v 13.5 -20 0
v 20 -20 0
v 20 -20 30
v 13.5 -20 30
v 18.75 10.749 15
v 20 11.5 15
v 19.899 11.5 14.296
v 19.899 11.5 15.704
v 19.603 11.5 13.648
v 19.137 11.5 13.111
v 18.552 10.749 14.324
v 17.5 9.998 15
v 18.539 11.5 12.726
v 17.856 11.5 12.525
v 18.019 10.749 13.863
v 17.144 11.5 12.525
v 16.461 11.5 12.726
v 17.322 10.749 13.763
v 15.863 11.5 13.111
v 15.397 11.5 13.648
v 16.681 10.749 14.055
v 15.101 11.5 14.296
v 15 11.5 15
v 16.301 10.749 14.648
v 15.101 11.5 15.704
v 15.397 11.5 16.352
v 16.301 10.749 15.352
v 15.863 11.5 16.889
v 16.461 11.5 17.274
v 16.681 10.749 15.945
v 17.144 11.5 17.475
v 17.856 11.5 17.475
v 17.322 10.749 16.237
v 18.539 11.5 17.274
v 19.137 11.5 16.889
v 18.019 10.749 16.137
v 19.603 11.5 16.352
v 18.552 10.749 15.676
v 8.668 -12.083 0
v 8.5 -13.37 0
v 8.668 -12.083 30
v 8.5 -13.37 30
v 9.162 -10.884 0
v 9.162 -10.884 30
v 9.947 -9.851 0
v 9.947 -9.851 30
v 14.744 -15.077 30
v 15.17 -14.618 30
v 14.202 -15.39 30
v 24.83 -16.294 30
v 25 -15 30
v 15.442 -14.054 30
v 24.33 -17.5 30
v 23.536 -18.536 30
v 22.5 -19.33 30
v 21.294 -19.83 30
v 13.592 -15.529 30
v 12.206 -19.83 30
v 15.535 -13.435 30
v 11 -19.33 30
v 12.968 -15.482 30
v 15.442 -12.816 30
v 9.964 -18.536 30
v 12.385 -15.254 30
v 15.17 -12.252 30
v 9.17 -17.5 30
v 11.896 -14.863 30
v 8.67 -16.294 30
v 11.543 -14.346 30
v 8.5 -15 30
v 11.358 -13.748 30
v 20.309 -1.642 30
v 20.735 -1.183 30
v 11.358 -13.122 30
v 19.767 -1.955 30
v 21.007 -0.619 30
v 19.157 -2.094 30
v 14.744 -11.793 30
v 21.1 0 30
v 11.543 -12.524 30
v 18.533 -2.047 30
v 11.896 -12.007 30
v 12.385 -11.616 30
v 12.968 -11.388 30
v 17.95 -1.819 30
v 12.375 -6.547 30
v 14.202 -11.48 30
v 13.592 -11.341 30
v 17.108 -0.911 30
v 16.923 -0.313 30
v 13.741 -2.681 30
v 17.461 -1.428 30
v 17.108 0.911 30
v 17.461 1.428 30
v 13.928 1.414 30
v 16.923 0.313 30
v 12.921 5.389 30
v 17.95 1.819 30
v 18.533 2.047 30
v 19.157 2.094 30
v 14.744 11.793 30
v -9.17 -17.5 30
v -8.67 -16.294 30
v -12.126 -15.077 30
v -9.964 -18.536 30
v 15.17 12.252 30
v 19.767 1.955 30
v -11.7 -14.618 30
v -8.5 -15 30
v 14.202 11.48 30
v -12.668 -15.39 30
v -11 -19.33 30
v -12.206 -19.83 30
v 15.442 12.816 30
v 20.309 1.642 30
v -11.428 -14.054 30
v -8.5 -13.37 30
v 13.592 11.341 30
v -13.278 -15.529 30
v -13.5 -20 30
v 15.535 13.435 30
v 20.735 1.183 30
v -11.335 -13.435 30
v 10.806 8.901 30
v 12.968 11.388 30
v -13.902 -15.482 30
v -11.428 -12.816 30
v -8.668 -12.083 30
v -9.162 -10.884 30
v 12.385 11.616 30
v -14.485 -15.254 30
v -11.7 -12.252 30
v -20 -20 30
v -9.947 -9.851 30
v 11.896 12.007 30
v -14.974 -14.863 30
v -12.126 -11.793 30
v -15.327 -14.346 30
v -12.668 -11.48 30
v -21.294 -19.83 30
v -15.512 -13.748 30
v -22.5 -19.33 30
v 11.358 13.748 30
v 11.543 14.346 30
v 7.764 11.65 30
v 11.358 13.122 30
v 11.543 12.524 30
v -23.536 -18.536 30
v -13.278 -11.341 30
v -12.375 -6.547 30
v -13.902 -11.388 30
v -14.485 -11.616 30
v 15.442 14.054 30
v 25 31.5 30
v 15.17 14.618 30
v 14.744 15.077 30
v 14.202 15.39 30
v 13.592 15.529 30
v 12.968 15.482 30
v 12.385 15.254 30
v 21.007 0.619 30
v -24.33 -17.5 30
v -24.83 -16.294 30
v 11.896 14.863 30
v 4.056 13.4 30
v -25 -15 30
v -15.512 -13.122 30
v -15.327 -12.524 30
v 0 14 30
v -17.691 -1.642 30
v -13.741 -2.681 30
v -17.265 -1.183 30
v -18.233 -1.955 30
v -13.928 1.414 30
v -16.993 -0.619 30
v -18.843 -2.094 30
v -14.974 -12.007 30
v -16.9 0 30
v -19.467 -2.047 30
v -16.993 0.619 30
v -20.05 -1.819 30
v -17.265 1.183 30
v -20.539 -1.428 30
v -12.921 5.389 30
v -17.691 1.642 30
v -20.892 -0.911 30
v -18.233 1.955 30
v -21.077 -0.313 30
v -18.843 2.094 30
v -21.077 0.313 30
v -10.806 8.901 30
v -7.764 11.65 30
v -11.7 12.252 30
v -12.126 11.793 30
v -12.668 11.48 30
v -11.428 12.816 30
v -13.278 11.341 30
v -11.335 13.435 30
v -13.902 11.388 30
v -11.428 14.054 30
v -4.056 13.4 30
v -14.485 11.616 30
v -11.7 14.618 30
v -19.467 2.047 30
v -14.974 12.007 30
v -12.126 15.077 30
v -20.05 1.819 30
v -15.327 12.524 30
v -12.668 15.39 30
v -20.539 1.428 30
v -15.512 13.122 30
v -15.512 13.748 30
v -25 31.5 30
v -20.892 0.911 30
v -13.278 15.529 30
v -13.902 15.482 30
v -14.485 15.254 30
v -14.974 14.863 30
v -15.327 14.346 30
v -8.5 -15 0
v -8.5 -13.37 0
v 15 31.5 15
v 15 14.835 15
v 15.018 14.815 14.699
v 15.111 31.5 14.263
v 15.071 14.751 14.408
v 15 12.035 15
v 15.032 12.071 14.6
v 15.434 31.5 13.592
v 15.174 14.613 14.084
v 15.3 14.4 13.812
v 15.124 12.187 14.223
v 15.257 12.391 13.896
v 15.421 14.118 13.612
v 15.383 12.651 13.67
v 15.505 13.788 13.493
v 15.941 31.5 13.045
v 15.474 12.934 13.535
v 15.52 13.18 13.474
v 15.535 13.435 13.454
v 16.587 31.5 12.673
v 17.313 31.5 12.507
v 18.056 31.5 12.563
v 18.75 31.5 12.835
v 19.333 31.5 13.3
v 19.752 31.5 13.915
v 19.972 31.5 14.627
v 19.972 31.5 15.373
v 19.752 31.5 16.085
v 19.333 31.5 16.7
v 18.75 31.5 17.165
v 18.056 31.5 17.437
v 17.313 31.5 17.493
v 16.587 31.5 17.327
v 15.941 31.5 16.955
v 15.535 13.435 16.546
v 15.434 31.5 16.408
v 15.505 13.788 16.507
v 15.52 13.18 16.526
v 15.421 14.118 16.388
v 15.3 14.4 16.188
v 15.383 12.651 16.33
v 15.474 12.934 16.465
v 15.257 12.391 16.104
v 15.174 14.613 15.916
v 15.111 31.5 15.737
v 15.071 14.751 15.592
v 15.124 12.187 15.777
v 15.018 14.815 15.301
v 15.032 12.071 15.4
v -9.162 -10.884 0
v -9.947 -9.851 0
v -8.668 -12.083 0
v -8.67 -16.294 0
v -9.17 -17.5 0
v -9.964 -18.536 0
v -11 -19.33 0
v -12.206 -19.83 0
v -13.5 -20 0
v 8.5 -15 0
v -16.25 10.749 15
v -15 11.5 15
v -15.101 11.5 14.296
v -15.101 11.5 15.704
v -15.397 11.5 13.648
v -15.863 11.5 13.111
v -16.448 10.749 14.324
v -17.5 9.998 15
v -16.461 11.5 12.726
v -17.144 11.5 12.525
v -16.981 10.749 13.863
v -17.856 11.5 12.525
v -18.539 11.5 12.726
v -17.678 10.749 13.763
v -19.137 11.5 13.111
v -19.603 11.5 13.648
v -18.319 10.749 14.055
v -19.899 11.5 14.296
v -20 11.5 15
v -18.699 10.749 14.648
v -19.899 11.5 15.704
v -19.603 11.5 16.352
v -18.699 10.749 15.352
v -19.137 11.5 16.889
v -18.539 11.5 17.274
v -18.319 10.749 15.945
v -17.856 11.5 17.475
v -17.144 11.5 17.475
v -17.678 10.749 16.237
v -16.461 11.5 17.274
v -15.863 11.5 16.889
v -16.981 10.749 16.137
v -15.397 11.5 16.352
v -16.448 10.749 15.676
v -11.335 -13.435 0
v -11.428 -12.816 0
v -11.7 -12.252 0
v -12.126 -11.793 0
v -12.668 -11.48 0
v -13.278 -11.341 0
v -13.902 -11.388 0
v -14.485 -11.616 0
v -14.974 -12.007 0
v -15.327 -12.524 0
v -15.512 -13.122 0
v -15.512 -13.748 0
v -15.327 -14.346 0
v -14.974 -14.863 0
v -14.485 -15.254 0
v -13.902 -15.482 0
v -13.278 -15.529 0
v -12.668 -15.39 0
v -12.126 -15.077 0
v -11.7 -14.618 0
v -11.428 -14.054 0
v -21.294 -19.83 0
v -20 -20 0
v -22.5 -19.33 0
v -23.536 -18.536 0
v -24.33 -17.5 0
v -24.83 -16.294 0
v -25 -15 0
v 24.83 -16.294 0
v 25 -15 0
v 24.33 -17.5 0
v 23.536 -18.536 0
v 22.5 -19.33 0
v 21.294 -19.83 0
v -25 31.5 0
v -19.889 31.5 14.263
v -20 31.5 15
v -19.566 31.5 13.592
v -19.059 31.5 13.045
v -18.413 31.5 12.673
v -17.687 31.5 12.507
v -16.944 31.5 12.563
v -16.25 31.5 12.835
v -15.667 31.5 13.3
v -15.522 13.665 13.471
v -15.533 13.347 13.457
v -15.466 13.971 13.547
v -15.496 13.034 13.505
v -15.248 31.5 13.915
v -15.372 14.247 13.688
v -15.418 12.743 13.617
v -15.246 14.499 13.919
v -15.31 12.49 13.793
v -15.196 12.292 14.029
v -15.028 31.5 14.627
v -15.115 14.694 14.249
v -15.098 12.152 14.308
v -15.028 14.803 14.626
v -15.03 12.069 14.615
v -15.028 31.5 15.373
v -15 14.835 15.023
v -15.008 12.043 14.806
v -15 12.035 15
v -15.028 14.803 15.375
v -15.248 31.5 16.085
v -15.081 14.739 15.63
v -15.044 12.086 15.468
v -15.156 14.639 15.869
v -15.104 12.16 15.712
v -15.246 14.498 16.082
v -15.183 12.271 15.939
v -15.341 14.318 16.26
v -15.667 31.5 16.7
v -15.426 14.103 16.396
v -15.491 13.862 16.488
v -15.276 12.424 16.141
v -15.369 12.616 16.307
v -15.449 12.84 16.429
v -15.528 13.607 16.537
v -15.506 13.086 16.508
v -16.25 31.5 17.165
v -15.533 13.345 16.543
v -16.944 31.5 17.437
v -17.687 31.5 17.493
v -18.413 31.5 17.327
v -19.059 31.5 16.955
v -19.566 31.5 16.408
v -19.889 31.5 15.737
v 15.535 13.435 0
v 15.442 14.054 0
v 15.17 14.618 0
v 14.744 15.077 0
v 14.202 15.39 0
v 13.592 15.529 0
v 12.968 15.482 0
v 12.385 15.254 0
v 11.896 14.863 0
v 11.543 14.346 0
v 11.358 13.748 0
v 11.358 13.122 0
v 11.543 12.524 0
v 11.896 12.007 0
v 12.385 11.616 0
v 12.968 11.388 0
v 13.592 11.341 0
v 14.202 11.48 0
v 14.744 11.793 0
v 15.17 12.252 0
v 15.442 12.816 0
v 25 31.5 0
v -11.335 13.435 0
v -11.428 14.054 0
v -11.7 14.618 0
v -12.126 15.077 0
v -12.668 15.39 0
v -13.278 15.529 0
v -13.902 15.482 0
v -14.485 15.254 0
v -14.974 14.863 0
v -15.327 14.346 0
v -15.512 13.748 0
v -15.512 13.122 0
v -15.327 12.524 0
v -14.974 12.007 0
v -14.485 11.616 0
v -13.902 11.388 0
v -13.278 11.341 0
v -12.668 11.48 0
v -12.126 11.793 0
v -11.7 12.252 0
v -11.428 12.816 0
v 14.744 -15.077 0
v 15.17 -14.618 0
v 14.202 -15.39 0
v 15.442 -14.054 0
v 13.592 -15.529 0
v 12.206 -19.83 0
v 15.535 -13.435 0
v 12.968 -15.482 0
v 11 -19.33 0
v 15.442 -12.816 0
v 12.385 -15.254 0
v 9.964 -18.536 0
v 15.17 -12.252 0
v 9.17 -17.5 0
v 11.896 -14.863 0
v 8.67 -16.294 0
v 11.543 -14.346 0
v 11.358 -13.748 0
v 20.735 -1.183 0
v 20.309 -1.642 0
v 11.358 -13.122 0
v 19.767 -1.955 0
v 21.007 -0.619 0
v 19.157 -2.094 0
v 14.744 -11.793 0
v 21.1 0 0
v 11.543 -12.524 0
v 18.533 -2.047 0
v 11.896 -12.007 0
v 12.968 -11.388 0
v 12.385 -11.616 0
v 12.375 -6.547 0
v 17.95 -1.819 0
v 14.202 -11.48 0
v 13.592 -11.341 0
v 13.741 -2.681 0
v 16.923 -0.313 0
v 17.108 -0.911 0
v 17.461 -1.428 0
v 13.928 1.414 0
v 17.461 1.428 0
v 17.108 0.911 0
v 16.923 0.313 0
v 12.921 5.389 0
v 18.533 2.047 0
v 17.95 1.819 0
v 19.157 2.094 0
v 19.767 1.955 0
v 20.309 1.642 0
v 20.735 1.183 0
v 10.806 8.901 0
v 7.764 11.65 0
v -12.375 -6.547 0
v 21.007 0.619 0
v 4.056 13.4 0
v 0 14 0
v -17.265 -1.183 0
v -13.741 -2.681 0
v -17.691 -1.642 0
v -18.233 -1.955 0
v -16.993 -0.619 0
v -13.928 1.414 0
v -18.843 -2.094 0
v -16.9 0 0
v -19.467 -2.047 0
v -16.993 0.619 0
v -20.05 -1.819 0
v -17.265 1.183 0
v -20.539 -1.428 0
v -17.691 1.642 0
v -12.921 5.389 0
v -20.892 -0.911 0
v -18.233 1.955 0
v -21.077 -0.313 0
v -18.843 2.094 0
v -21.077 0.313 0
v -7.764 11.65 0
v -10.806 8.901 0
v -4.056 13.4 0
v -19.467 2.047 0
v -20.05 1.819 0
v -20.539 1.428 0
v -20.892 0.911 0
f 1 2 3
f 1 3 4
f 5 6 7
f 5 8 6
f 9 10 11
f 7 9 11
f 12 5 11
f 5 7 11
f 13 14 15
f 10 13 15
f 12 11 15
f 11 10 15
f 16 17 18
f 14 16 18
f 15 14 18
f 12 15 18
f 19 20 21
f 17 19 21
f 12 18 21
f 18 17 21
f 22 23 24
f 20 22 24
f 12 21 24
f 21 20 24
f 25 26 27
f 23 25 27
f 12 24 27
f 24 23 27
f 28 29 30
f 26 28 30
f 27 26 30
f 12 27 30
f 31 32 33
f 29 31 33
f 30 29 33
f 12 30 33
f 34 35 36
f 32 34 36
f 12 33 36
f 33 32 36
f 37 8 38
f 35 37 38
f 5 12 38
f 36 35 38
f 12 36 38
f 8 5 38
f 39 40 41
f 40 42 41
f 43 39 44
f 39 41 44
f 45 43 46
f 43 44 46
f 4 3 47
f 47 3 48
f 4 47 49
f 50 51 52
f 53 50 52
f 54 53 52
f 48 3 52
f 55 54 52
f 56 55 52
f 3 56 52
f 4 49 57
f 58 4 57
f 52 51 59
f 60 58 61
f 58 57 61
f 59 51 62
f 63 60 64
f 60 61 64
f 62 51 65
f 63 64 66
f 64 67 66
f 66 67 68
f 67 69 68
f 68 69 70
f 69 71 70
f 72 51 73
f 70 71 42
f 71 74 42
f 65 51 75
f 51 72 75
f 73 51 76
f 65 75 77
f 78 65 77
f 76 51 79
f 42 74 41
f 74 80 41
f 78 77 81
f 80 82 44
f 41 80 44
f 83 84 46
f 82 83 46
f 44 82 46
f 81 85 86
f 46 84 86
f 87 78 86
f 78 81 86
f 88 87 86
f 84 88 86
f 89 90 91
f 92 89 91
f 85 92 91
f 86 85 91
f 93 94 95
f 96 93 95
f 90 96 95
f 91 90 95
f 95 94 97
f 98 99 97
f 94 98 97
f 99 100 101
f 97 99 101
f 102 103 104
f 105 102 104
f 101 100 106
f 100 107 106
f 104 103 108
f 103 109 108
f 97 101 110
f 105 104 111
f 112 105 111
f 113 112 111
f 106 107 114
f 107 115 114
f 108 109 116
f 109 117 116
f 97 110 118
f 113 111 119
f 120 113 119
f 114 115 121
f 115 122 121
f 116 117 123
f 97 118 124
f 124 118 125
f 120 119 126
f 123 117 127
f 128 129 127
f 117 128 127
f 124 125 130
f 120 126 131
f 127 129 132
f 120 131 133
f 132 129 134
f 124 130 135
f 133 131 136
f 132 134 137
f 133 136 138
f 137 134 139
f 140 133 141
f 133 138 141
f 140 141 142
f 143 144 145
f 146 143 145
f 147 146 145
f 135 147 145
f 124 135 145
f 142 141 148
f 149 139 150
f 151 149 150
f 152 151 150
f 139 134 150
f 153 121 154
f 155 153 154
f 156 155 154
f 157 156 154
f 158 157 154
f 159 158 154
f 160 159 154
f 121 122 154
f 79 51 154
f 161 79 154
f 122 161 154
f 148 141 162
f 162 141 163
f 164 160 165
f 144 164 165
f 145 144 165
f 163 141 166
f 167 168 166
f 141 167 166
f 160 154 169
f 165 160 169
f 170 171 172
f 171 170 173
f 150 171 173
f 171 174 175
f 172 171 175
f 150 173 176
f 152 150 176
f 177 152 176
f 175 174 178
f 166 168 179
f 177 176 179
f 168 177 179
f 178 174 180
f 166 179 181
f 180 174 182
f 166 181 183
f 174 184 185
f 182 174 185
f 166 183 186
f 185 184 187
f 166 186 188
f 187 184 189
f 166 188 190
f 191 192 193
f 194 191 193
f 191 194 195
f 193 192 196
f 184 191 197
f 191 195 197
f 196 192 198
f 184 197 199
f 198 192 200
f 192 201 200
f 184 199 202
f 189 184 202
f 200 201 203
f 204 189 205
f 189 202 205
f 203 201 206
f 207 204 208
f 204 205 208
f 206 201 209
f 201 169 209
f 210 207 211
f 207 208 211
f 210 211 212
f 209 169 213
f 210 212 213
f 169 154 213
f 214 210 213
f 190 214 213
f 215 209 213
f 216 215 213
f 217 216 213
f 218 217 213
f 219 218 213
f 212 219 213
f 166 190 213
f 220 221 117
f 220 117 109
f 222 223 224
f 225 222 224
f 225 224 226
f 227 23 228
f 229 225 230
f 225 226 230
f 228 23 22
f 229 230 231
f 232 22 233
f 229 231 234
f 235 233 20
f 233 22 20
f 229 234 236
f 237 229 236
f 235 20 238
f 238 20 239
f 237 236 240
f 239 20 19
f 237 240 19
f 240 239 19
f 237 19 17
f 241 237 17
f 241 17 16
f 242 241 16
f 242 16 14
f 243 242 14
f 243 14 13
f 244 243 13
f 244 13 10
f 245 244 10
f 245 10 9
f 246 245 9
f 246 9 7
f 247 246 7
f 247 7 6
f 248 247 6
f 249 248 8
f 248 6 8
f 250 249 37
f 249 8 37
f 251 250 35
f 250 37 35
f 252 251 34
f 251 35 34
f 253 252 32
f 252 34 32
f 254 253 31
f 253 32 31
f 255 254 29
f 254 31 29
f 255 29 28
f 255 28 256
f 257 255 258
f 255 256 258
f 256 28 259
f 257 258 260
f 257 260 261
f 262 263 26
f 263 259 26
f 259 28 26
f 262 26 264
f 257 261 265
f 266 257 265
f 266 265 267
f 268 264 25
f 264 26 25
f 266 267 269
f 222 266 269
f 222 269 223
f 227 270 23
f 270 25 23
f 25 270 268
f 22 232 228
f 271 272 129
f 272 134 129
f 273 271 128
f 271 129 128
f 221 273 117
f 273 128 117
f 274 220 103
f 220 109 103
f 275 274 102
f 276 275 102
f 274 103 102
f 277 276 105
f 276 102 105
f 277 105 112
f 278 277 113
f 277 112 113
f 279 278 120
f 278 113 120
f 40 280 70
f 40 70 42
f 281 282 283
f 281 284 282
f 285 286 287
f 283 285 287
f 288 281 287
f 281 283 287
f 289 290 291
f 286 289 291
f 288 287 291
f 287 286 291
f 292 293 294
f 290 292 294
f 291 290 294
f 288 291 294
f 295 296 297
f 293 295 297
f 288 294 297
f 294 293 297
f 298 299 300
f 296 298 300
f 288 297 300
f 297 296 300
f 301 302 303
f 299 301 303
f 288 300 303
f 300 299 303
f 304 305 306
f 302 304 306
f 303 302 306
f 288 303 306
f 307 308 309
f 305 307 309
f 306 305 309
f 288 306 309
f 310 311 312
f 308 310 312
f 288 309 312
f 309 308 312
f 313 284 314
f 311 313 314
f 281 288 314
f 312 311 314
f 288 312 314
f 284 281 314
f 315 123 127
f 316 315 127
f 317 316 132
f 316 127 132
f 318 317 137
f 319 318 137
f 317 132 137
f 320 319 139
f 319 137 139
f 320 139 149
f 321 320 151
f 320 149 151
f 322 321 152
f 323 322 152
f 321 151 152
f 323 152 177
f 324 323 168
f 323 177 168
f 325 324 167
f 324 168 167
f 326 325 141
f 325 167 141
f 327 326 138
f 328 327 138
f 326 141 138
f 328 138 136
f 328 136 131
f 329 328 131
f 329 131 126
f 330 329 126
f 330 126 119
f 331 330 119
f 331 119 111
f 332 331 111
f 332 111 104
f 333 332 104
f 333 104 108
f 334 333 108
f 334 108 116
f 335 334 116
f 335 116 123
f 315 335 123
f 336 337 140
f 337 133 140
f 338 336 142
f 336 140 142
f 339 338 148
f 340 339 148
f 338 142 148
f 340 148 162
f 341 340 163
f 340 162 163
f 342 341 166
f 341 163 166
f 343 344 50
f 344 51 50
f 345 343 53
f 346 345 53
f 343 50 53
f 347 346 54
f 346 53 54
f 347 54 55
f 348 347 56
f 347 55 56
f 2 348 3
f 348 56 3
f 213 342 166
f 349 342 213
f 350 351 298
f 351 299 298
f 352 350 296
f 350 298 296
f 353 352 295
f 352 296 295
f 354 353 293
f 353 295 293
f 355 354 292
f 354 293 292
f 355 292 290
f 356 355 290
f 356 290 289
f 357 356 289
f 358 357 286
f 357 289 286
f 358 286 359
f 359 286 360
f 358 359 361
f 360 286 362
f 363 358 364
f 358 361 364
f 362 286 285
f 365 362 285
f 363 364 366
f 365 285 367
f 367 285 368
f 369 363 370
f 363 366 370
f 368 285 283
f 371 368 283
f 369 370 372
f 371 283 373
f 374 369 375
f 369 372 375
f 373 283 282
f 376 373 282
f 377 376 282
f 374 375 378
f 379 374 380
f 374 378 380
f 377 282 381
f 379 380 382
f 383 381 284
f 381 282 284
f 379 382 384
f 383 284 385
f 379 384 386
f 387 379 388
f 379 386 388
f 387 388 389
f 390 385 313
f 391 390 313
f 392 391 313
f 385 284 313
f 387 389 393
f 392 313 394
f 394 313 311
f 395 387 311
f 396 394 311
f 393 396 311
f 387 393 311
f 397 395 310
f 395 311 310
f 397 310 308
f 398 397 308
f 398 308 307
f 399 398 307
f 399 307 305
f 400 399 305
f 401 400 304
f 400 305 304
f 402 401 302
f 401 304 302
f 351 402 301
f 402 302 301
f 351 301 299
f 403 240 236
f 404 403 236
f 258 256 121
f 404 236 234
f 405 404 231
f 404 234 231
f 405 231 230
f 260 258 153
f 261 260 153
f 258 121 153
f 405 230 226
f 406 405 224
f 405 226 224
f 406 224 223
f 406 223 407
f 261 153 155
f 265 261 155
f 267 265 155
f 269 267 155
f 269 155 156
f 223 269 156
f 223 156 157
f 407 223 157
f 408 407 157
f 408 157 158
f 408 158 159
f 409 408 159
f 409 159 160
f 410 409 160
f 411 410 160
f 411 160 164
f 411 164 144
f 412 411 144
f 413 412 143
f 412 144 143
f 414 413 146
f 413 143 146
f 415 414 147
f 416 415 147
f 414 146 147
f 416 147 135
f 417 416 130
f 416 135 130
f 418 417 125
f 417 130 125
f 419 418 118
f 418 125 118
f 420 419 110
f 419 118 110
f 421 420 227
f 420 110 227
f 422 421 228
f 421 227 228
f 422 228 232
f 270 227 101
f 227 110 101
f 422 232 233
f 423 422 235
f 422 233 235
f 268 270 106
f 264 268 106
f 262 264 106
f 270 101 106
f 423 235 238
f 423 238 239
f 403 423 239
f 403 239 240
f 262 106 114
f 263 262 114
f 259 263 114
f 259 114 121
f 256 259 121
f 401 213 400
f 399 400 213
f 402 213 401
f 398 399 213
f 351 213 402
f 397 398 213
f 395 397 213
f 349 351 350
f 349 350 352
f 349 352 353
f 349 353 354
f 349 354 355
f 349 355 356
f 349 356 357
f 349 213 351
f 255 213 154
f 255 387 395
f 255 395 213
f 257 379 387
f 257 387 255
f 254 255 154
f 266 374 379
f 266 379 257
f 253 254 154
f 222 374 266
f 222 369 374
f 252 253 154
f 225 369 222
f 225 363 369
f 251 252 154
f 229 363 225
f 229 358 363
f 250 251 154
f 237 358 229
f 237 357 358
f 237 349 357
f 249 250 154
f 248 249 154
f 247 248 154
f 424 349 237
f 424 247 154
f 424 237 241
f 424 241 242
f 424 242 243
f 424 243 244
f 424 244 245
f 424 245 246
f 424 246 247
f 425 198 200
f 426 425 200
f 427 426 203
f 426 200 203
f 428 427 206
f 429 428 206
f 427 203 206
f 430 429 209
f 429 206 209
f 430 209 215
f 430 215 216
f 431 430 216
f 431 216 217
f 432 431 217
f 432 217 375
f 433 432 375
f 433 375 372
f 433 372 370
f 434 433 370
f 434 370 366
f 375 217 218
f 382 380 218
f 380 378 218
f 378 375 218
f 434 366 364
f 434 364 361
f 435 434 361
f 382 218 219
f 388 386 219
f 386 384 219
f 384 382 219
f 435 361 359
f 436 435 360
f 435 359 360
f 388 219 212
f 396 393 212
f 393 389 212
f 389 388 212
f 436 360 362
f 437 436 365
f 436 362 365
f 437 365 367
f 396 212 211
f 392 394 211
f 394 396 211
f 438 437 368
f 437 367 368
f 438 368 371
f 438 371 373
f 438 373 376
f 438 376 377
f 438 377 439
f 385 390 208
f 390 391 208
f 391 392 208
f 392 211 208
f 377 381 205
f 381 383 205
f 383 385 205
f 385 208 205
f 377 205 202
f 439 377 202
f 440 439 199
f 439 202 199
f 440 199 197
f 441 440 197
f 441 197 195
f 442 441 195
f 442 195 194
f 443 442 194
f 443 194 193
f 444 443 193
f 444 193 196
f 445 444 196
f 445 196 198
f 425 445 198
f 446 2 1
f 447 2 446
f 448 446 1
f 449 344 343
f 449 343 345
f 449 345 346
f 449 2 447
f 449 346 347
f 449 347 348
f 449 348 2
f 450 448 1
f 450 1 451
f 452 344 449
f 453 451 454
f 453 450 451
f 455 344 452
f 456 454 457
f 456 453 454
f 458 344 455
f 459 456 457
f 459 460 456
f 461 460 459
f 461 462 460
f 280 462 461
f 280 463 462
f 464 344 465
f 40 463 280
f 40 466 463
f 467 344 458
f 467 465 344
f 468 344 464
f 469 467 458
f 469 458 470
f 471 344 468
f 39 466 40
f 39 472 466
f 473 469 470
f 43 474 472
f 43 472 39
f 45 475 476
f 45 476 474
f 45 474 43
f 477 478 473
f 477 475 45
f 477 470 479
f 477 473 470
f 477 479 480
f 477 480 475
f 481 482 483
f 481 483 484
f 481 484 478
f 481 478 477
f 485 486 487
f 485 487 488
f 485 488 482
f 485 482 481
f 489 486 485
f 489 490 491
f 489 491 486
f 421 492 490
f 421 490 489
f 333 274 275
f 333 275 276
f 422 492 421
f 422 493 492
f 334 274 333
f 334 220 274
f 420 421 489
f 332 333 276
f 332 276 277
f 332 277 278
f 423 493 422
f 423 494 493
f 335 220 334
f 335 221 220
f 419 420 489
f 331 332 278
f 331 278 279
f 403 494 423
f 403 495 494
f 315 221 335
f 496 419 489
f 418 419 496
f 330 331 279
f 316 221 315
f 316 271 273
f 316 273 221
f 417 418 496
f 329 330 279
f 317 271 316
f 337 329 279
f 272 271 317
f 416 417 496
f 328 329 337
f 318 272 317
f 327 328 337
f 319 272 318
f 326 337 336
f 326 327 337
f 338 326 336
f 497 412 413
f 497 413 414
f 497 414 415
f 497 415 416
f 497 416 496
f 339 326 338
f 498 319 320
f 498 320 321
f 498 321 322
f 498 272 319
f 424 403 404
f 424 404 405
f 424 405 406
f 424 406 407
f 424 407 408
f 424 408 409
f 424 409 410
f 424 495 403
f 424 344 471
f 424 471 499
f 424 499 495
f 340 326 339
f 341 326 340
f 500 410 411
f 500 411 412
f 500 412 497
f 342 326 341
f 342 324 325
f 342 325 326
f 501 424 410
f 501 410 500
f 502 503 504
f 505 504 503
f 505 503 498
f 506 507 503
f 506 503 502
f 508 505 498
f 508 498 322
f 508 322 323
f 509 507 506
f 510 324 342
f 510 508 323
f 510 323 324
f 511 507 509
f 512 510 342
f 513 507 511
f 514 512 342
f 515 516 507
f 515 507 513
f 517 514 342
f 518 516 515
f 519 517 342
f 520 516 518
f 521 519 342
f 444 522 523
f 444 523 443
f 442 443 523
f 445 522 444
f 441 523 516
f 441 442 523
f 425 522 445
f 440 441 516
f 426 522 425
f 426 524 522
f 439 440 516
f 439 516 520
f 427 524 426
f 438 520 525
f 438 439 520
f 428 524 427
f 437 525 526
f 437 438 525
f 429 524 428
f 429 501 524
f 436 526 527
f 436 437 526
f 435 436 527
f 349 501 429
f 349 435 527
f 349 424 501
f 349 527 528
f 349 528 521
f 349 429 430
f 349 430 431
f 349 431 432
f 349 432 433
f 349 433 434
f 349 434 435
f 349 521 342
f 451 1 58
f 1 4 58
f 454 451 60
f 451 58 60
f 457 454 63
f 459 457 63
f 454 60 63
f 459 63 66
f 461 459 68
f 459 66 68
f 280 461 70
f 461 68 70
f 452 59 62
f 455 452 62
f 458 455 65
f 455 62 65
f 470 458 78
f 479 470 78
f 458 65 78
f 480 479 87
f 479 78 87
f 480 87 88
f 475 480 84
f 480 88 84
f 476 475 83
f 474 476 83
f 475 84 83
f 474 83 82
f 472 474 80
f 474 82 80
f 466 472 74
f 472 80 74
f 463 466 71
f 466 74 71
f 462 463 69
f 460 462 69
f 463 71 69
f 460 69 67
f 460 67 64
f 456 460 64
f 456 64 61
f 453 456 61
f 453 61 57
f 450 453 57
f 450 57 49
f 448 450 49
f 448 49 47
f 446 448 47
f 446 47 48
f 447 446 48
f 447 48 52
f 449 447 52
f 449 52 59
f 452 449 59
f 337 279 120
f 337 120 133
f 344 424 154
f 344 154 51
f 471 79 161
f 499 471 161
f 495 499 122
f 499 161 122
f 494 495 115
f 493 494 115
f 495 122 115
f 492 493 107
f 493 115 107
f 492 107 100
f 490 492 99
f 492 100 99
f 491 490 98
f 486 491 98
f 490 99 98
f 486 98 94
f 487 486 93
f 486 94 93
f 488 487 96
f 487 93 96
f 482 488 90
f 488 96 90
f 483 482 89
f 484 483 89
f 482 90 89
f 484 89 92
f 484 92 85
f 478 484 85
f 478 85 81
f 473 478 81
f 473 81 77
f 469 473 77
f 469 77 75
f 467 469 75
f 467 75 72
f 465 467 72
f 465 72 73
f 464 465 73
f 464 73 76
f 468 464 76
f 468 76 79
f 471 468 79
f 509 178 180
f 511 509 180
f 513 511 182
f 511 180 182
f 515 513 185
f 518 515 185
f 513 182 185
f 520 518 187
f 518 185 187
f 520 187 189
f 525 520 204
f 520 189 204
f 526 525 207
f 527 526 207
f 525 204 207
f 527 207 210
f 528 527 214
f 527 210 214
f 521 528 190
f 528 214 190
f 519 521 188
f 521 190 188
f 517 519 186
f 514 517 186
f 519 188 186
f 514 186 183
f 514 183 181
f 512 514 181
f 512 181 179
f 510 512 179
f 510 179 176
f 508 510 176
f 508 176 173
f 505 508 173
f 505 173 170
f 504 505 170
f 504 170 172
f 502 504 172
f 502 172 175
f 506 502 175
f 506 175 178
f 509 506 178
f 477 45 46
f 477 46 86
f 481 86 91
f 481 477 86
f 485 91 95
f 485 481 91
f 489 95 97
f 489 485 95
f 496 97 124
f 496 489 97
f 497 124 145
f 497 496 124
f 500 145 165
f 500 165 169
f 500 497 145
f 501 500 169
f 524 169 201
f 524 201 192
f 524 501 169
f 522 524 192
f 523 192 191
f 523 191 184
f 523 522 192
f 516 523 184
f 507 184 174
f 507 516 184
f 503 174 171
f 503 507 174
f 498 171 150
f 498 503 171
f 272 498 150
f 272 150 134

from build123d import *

# Parameters (mm, degrees)
EXTRUDE1_DEPTH        = 30
FILLET1_R             = 5
M5_TAPPED_HOLE1_D     = 4.2
M6_TAPPED_HOLE1_D     = 5
M6_TAPPED_HOLE1_DEPTH = 20
M6_TAPPED_HOLE1_TIP   = 1.502151548


with BuildPart() as part:
    # Sketch1 → Extrude1 (new body)
    with BuildSketch(Plane.XY):
        with BuildLine():
            Line((-25, 31.5), (25, 31.5))
            Line((25, 31.5), (25, -20))
            Line((25, -20), (8.5, -20))
            Line((8.5, -20), (8.5, -11.124297731))
            ThreePointArc((8.5, -11.124297731), (0, 14), (-8.5, -11.124297731))
            Line((-8.5, -11.124297731), (-8.5, -20))
            Line((-8.5, -20), (-25, -20))
            Line((-25, -20), (-25, 31.5))
        make_face()
    extrude(amount=EXTRUDE1_DEPTH)

    # Fillet1
    fillet1_edges = [part.edges().sort_by_distance(p)[0] for p in [
        (-8.5, -20, 15),
        (-25, -20, 15),
        (25, -20, 15),
        (8.5, -20, 15),
        (8.5, -11.124297731, 15),
        (-8.5, -11.124297731, 15),
    ]]
    fillet(fillet1_edges, radius=FILLET1_R)

    # M5 Tapped Hole1 (through all)
    with Locations(Plane(origin=(0, 0, 0), x_dir=(-1, 0, 0), z_dir=(0, 0, -1))):
        with Locations((-13.435028843, 13.435028843), (13.435028843, 13.435028843), (19, 0), (13.435028843, -13.435028843), (-13.435028843, -13.435028843), (-19, 0)):
            Hole(M5_TAPPED_HOLE1_D / 2)

    # M6 Tapped Hole1
    with Locations(Plane(origin=(0, 31.5, 0), x_dir=(1, 0, 0), z_dir=(0, 1, 0))):
        with Locations((-17.5, -15), (17.5, -15)):
            Hole(M6_TAPPED_HOLE1_D / 2, depth=M6_TAPPED_HOLE1_DEPTH)
            with Locations((0, 0, -(M6_TAPPED_HOLE1_DEPTH + M6_TAPPED_HOLE1_TIP / 2))):  # 118° drill point
                Cone(0, M6_TAPPED_HOLE1_D / 2, M6_TAPPED_HOLE1_TIP, mode=Mode.SUBTRACT)


solid = part.part
